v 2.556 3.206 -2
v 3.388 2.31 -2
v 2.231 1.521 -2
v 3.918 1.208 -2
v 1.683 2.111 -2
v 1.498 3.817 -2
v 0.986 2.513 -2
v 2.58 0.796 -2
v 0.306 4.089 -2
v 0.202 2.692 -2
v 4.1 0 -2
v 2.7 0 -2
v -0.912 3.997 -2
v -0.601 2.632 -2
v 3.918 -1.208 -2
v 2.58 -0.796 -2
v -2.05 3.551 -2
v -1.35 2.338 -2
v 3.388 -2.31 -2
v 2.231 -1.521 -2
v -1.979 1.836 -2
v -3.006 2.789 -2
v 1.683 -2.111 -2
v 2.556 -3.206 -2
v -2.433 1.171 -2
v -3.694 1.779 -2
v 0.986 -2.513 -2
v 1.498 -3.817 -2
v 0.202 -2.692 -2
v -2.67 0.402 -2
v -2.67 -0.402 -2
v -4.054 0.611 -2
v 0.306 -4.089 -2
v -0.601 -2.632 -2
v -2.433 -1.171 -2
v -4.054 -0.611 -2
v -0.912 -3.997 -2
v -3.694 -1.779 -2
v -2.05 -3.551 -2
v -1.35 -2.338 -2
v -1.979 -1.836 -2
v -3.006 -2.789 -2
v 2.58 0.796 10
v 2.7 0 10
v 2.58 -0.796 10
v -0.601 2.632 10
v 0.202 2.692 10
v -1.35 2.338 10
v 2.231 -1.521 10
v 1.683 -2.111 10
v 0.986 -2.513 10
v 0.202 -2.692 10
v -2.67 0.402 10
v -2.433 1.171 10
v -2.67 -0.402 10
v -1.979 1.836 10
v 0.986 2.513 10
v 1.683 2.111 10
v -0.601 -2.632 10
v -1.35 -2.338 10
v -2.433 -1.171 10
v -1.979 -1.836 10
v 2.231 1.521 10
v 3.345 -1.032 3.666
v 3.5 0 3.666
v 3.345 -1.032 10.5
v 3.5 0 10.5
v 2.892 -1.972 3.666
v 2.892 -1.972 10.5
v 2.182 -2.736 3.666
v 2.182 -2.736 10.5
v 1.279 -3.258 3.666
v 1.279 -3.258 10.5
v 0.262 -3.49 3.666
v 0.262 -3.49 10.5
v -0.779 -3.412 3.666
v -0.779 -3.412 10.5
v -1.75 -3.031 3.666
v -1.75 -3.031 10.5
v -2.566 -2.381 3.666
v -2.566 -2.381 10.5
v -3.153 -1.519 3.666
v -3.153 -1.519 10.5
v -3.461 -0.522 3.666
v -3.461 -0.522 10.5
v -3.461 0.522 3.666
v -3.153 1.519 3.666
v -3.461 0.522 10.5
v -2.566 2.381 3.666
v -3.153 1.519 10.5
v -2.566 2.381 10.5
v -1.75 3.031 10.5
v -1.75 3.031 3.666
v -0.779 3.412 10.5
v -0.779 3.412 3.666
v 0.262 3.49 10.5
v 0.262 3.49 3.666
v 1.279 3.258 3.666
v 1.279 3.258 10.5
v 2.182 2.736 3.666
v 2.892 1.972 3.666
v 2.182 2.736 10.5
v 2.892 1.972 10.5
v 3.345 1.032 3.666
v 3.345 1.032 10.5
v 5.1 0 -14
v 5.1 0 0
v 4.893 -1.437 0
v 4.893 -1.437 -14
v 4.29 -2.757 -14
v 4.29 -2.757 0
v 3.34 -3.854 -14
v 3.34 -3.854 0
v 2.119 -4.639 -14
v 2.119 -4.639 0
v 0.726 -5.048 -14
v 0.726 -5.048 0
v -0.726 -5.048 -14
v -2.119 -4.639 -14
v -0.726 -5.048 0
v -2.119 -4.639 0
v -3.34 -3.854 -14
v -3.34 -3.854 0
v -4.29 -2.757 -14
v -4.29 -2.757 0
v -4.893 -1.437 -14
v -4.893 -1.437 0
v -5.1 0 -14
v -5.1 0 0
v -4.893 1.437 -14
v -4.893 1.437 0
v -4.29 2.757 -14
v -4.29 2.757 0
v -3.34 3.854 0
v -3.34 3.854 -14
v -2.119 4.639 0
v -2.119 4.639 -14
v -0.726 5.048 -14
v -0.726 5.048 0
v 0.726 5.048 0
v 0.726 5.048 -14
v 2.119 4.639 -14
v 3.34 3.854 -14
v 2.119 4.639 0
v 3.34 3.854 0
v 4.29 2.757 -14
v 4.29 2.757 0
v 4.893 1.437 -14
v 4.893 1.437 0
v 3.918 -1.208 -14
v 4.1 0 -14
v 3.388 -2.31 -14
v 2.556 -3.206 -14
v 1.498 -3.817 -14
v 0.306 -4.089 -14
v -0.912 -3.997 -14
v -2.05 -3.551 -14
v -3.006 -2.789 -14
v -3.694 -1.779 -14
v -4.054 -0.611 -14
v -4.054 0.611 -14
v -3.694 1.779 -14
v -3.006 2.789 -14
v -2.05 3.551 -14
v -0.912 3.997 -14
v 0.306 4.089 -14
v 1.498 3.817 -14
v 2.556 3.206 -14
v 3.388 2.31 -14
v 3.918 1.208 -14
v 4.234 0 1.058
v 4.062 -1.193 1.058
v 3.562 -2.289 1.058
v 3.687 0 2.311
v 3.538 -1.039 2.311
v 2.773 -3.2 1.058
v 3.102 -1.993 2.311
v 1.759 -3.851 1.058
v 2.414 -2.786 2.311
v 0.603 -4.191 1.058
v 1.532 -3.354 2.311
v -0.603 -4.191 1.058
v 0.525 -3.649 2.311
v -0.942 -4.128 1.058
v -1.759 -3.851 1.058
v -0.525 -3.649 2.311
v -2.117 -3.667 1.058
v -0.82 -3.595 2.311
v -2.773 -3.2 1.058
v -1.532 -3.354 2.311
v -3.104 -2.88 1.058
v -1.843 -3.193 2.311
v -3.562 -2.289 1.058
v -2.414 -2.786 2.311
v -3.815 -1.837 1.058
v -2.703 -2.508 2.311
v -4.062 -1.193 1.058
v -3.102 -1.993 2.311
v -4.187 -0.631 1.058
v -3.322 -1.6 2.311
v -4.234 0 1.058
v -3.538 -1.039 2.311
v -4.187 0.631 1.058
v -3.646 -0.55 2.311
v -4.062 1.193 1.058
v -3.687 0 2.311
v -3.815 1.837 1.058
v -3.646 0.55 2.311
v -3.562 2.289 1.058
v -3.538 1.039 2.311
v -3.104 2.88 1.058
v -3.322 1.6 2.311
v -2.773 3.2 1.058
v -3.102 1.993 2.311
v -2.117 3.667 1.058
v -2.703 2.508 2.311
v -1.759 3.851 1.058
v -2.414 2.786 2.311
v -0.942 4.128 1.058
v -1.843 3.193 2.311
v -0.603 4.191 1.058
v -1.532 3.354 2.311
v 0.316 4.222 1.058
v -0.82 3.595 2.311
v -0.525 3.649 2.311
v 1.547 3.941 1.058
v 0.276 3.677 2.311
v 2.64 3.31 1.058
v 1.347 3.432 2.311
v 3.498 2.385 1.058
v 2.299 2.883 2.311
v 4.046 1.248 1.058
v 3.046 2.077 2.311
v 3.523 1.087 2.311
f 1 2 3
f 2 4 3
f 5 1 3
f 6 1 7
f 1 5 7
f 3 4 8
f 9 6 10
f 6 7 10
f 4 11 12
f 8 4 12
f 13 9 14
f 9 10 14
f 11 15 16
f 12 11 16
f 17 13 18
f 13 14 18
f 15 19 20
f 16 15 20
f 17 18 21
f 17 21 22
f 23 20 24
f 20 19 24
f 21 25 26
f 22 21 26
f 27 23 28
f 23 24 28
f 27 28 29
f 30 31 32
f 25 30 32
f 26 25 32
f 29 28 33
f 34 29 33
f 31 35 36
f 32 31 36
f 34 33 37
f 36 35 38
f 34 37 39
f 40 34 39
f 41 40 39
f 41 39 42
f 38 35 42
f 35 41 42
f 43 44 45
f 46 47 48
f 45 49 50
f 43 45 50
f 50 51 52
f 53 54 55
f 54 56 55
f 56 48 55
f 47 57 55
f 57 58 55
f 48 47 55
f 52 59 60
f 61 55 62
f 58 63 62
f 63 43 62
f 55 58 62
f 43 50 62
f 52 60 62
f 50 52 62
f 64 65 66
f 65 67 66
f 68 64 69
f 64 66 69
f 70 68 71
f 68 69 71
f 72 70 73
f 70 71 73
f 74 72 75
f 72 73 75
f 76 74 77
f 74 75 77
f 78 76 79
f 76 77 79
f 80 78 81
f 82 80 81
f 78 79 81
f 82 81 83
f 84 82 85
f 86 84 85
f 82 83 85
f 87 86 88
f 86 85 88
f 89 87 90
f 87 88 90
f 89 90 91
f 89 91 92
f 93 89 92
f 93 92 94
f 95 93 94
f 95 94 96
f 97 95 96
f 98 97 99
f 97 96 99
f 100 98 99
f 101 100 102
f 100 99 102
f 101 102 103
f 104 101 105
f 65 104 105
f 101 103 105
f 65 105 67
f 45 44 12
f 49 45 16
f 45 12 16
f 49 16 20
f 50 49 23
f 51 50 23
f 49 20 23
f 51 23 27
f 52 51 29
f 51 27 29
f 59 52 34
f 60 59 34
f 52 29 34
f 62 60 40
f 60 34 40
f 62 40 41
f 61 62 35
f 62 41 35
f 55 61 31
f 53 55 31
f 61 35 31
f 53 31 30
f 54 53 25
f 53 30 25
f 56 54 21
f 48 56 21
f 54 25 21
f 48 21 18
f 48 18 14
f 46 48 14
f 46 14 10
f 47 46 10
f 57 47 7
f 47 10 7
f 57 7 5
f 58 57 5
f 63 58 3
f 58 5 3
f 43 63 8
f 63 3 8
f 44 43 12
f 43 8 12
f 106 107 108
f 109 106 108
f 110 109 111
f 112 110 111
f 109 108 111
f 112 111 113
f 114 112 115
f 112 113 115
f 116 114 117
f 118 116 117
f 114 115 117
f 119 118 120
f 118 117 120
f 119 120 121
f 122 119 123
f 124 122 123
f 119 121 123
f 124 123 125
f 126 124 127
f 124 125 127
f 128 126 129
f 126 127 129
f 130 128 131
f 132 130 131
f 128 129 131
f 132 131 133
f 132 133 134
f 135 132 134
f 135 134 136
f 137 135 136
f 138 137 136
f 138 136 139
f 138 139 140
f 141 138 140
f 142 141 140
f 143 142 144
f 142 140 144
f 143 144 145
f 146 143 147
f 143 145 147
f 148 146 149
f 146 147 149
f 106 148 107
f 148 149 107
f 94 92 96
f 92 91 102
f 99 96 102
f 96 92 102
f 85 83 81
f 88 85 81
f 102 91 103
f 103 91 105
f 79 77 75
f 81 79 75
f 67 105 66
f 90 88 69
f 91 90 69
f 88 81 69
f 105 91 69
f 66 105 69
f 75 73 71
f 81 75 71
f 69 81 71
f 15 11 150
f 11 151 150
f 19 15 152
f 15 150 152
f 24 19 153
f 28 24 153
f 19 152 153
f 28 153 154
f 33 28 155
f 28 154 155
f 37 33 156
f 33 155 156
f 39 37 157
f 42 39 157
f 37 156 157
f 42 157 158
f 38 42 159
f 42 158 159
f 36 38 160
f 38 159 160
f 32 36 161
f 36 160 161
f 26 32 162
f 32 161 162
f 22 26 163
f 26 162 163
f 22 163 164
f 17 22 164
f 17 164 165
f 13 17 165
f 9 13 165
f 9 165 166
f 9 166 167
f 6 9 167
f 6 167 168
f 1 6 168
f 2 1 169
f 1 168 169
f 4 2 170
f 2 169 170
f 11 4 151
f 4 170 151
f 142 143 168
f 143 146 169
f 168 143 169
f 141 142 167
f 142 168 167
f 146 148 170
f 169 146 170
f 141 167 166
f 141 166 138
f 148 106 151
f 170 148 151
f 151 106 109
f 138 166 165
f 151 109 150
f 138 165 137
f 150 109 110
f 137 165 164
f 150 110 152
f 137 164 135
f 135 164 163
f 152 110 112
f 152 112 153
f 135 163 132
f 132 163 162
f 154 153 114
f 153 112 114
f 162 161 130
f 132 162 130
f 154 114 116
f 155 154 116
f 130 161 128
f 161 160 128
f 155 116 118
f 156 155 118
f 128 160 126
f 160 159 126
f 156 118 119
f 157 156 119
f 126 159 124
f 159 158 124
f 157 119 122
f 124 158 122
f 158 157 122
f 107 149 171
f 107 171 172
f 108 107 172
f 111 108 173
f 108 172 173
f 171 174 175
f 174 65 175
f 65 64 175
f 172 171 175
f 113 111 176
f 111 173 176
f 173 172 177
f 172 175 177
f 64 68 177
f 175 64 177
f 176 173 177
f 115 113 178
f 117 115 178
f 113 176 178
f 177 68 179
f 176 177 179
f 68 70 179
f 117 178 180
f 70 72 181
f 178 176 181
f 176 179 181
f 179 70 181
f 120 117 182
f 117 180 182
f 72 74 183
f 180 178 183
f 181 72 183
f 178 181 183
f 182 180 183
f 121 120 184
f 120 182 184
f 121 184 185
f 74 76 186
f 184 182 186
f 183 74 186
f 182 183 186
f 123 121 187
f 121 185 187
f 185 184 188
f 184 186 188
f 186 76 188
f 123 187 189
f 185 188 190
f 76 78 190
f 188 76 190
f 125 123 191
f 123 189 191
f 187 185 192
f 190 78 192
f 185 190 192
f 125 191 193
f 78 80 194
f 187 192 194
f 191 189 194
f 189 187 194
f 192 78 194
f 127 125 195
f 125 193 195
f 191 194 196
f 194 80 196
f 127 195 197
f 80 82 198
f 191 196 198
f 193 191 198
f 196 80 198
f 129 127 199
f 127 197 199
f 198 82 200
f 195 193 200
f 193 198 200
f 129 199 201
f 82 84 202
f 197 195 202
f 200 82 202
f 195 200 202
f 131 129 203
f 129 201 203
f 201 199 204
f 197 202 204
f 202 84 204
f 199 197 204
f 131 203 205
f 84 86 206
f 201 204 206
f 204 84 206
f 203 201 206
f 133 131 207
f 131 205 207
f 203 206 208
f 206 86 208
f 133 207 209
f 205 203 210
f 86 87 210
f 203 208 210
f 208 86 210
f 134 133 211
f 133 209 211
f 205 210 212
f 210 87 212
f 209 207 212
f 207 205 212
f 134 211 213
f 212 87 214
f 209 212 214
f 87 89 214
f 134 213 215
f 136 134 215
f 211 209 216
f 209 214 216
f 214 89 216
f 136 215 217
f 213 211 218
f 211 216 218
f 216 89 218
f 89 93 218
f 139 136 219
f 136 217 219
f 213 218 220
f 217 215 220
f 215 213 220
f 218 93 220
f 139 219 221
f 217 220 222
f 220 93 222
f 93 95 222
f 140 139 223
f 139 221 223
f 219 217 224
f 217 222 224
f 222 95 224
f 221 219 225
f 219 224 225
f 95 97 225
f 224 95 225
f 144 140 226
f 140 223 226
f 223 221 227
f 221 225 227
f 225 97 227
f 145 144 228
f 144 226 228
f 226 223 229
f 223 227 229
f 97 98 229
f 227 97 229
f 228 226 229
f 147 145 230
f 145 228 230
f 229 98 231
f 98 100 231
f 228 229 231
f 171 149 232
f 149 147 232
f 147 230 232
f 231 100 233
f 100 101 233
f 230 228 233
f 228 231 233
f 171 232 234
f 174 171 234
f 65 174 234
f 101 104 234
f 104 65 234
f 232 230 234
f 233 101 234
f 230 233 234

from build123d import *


# Not quite as in the source:
# - a fillet or chamfer that OpenCascade refuses, or shapes differently, is made with other operations: its cross-section is extruded or revolved along the edge and cut away or added


with BuildPart() as f1:
    # F0 (on Front) → F1 (revolve)
    with BuildSketch(Plane.XZ):
        Polygon((4.1, -14), (5.1, -14), (5.1, 0), (3.5, 0), (3.5, 10.5), (0, 10.5), (0, 10), (2.7, 10), (2.7, -2), (4.1, -2), align=None)
    revolve(axis=Axis((0, 0, -6.7832856439), (0, 0, -1)))

    # F2: fillet of radius 5 on 1 edges, made by hand

    # F2_s1 → F2_t2 (revolve)
    with BuildSketch(Plane.XZ):
        with BuildLine():
            ThreePointArc((5.1, 0), (3.917424305, 1.666060556), (3.5, 3.666060556))
            Line((3.5, 3.666060556), (3.5, 0))
            Line((3.5, 0), (5.1, 0))
        make_face()
    revolve(axis=Axis((0, 0, 0), (0, 0, -1)))


solid = f1.part
